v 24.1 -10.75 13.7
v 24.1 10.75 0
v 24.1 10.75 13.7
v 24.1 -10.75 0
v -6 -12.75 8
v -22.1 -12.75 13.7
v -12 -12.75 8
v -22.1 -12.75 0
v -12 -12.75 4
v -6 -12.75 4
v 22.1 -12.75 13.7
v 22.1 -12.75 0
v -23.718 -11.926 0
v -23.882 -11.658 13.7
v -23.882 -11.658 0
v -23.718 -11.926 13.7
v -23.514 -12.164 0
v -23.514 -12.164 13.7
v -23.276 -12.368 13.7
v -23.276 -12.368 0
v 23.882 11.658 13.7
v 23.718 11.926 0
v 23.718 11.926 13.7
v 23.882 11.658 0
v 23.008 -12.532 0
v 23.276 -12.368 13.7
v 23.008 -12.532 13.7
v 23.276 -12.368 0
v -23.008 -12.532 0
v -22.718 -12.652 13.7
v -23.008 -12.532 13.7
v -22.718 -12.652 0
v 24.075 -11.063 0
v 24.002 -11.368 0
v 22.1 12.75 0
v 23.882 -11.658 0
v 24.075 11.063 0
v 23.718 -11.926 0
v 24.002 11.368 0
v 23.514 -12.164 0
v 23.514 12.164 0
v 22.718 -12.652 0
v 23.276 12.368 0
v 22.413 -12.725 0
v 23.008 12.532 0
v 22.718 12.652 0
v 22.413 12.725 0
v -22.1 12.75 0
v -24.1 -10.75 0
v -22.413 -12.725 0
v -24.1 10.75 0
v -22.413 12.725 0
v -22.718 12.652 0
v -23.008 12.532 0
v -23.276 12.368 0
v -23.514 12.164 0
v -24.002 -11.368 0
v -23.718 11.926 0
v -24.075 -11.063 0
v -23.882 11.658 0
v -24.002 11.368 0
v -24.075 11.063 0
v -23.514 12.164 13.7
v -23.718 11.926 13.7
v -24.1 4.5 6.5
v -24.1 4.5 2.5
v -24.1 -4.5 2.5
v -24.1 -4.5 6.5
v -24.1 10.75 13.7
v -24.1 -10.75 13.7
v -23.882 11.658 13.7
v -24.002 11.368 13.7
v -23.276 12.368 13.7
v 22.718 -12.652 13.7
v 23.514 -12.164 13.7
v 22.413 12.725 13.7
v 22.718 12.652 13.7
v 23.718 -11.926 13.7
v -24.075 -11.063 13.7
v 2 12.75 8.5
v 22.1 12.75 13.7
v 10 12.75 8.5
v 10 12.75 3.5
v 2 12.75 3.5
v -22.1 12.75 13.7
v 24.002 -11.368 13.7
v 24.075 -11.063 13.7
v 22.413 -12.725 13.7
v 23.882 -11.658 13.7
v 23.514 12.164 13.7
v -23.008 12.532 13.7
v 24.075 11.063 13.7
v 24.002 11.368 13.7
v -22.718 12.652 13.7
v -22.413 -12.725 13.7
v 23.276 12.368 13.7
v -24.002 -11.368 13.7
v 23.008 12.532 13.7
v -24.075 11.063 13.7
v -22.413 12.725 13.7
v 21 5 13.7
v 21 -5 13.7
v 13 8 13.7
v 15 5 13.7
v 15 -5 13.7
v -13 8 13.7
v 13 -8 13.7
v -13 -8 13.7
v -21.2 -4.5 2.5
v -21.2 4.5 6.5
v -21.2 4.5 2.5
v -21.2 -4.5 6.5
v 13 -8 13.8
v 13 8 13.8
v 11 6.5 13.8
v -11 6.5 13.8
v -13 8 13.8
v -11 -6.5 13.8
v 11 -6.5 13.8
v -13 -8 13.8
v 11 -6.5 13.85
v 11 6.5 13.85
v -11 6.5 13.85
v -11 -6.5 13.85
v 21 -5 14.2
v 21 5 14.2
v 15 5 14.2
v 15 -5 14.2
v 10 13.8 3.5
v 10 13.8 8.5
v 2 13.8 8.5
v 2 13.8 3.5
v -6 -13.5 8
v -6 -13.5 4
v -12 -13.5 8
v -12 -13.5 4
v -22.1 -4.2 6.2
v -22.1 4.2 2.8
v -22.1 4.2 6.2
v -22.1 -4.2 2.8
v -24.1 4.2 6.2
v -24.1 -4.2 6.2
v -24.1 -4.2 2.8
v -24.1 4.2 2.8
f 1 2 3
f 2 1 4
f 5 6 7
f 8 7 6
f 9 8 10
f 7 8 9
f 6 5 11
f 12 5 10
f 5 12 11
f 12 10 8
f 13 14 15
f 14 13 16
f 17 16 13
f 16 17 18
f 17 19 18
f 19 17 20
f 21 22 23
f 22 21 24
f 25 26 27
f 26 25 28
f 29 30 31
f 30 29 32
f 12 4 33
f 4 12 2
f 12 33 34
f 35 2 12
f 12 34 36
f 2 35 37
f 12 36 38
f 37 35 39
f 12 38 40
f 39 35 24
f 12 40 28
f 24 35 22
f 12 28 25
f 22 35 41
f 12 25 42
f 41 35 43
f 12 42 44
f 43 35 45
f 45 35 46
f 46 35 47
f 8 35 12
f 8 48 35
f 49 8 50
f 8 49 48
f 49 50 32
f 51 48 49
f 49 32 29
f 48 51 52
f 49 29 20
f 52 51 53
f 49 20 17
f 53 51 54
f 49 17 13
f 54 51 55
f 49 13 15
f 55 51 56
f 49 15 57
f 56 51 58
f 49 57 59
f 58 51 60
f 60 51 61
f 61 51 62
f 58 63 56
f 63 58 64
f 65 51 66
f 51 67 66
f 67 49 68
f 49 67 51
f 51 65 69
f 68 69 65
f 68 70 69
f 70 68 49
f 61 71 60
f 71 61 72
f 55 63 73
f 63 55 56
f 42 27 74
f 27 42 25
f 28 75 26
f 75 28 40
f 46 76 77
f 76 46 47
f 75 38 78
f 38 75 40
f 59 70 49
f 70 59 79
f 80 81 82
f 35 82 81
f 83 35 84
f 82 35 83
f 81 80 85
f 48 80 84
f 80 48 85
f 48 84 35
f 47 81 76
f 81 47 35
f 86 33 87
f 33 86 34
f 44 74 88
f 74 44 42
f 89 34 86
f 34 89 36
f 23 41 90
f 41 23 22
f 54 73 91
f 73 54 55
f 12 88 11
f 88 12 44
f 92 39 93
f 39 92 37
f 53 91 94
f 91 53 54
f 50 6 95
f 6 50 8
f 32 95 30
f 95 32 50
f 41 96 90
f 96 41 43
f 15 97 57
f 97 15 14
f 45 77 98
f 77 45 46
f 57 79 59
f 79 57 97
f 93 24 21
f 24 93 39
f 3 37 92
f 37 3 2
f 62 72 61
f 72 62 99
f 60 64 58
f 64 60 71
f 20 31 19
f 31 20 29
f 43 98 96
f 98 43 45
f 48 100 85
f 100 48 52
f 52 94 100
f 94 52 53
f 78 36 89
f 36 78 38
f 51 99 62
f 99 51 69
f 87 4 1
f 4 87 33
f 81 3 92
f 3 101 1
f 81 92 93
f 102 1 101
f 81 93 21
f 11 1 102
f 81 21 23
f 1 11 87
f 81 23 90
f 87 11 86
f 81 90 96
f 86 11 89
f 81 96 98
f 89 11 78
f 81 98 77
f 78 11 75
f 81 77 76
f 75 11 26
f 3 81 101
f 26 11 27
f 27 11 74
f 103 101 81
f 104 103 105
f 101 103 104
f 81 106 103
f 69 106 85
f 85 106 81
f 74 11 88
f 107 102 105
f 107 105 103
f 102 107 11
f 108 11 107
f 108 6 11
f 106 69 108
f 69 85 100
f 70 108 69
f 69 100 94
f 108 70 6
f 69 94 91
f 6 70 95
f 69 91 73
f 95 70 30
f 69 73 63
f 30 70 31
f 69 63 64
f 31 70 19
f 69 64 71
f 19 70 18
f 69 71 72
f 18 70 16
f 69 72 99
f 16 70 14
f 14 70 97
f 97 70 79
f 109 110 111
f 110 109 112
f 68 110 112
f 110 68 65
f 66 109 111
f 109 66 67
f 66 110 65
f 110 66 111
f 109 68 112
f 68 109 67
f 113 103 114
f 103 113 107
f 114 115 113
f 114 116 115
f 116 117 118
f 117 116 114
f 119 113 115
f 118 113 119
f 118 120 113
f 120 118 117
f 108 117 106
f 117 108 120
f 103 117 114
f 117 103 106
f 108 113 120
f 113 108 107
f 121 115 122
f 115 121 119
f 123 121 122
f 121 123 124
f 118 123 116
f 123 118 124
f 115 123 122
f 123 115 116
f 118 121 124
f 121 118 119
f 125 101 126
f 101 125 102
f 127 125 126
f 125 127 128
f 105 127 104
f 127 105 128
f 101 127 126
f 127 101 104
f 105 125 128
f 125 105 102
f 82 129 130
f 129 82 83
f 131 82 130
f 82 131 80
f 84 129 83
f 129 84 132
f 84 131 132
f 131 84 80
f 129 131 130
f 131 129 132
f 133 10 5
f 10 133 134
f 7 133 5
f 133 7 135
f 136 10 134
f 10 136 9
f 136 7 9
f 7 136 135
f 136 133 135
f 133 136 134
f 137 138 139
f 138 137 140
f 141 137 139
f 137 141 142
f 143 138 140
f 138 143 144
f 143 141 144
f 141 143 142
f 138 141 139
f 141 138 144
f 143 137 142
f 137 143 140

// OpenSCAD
// =============================================================================
// CogniLink Assistive Technology - M5StickC Reference Mockup
// =============================================================================
// Reference 3D model of the M5Stack M5StickC development kit:
// Dimensions: 48.2 x 25.5 x 13.7 mm
// Features: 0.96" TFT LCD, Button A, Button B, USB-C port, power switch
// Used for visual fit clearance checks and CSG boolean cuts in OpenSCAD
// =============================================================================

$fn = 40;

module m5stickc_module() {
    // Main enclosure body (Orange polycarbonate)
    color([0.98, 0.45, 0.05]) {
        difference() {
            // Rounded outer body
            hull() {
                translate([-24.1 + 2, -12.75 + 2, 0]) cylinder(r=2, h=13.7);
                translate([ 24.1 - 2, -12.75 + 2, 0]) cylinder(r=2, h=13.7);
                translate([-24.1 + 2,  12.75 - 2, 0]) cylinder(r=2, h=13.7);
                translate([ 24.1 - 2,  12.75 - 2, 0]) cylinder(r=2, h=13.7);
            }
            // USB-C port cavity (-X face)
            translate([-24.2, -4.5, 2.5])
                cube([3.0, 9.0, 4.0]);
        }
    }

    // 0.96" TFT LCD Display (Black glass with active screen region)
    color([0.1, 0.1, 0.12]) {
        translate([-13.0, -8.0, 13.6])
            cube([26.0, 16.0, 0.2]);
    }
    // Active display pixel area (Deep blue / cyan backlight glow)
    color([0.0, 0.6, 0.9, 0.8]) {
        translate([-11.0, -6.5, 13.75])
            cube([22.0, 13.0, 0.1]);
    }

    // Button A (Front click button, dark grey)
    color([0.25, 0.25, 0.28]) {
        translate([15.0, -5.0, 13.6])
            cube([6.0, 10.0, 0.6]);
    }

    // Button B (Side reset button, dark grey on +Y side)
    color([0.25, 0.25, 0.28]) {
        translate([2.0, 12.6, 3.5])
            cube([8.0, 1.2, 5.0]);
    }

    // Power Switch (Red slider on -Y side)
    color([0.85, 0.15, 0.15]) {
        translate([-12.0, -13.5, 4.0])
            cube([6.0, 1.0, 4.0]);
    }

    // USB-C Metal Receptacle
    color([0.75, 0.75, 0.78]) {
        translate([-24.1, -4.2, 2.8])
            cube([2.0, 8.4, 3.4]);
    }
}

// Render preview
m5stickc_module();
